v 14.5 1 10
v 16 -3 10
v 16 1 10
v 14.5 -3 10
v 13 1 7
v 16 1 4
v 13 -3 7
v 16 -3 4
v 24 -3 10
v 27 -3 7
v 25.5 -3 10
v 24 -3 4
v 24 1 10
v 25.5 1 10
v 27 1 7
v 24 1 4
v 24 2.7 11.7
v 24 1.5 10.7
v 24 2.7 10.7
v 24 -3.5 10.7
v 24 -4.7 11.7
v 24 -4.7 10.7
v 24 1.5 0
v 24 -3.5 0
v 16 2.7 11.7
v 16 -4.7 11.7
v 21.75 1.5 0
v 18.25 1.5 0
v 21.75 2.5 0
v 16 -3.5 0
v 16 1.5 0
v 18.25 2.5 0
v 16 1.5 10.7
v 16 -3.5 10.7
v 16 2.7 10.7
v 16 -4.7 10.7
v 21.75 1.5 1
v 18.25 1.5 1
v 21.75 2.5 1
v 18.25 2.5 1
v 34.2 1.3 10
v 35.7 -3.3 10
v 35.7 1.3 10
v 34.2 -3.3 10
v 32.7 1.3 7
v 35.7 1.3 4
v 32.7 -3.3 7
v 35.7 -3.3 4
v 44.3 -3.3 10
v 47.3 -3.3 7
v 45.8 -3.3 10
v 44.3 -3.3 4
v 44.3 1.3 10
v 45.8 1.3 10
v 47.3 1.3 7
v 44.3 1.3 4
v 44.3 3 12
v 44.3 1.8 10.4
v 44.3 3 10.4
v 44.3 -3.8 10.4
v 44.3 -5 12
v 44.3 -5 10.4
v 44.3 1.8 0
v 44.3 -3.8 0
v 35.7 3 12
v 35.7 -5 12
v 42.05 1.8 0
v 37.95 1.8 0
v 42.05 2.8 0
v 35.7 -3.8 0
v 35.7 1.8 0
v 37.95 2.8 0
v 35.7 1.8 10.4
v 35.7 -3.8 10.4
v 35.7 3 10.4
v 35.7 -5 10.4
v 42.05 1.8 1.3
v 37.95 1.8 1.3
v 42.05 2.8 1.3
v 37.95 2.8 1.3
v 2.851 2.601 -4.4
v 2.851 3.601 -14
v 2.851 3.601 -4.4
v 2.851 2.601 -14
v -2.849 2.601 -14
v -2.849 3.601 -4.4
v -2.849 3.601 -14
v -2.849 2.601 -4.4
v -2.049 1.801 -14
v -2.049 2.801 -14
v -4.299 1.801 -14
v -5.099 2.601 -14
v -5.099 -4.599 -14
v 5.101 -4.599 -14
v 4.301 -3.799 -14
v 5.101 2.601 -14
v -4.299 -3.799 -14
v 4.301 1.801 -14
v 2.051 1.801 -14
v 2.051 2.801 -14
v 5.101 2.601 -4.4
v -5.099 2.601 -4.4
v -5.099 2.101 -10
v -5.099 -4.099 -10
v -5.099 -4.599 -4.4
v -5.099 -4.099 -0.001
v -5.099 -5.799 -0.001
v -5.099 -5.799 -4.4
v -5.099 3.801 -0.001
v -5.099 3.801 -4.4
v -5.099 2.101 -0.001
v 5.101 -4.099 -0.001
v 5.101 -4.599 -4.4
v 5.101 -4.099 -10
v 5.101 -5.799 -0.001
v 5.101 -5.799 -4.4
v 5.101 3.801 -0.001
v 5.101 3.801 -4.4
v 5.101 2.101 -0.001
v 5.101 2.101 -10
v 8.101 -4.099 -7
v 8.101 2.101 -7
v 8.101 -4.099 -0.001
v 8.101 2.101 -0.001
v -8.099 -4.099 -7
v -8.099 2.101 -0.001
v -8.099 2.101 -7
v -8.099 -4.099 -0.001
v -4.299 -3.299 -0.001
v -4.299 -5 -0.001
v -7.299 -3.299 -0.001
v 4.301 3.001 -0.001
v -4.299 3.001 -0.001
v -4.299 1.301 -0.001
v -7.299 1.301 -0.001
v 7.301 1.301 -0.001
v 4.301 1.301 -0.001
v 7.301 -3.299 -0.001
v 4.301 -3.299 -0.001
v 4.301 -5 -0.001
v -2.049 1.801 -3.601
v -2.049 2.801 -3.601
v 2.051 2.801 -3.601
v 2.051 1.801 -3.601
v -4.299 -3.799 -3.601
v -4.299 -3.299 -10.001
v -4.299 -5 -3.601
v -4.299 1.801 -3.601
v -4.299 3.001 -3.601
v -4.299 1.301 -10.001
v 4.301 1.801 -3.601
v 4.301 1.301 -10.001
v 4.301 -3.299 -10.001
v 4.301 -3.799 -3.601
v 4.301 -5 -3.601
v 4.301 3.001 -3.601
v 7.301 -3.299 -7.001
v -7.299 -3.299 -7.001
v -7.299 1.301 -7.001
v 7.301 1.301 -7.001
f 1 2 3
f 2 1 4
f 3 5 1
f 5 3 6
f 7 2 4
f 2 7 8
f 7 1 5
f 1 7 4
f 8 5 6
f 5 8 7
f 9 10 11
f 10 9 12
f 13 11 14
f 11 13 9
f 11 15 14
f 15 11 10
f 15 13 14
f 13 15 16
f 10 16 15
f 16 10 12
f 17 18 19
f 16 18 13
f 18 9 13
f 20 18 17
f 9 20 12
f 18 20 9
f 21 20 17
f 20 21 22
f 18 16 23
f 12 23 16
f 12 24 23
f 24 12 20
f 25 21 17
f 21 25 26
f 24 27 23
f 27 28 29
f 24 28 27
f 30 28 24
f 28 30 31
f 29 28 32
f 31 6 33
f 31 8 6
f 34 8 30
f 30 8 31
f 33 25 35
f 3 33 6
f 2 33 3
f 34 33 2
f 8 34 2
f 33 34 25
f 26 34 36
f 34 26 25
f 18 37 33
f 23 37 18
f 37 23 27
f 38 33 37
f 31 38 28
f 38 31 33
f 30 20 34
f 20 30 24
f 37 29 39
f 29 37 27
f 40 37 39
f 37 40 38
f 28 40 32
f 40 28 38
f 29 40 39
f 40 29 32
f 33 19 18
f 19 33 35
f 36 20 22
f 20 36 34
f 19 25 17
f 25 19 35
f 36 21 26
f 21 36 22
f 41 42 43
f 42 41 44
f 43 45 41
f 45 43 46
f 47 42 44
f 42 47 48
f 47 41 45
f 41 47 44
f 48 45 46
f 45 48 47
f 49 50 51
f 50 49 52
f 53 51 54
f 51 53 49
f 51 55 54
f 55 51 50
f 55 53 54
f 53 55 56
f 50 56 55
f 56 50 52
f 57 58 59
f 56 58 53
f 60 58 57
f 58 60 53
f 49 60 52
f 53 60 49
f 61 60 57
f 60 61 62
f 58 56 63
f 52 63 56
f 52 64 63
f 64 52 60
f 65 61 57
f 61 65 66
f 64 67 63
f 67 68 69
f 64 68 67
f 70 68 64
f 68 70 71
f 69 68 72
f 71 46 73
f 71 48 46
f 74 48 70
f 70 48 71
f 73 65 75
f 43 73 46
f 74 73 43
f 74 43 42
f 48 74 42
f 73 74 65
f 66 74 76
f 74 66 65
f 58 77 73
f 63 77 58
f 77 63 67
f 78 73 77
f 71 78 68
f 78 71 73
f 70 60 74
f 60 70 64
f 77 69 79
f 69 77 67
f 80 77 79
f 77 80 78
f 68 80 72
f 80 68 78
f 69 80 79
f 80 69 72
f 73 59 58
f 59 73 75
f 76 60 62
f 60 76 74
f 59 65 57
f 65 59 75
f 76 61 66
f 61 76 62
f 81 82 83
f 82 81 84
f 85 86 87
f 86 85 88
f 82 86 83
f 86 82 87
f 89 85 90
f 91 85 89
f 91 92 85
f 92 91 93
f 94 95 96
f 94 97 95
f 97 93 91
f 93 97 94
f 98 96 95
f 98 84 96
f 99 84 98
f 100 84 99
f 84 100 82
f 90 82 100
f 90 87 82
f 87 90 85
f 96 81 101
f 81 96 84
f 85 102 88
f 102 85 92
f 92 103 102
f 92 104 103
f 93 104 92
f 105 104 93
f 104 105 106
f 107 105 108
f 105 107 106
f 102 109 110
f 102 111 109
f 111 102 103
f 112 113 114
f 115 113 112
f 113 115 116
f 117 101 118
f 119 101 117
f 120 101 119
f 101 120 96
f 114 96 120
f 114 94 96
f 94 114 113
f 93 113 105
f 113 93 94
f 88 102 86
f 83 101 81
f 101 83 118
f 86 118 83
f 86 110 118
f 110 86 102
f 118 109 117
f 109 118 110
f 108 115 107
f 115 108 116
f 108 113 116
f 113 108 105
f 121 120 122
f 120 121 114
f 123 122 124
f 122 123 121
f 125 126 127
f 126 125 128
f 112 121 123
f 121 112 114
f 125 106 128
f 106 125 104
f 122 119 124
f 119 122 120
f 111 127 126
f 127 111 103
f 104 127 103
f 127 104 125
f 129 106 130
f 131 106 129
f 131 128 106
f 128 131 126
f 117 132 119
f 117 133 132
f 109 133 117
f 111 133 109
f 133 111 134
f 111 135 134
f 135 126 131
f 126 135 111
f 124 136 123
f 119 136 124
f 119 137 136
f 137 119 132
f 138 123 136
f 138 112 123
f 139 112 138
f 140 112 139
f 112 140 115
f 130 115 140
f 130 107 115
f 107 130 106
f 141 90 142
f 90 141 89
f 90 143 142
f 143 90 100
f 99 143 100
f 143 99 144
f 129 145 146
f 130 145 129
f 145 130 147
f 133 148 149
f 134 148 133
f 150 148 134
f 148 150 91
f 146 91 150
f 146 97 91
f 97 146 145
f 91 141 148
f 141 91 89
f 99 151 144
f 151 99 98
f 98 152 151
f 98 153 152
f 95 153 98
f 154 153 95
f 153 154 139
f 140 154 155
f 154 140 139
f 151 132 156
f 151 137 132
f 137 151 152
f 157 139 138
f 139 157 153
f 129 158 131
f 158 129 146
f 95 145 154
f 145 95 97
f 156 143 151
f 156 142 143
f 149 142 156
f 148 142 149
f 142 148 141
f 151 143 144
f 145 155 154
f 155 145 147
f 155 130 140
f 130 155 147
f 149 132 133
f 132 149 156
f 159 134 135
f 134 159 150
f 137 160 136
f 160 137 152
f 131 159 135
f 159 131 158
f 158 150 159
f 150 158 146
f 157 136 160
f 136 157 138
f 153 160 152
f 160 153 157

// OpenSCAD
// file: sculpt.scad
module sculpt()
{
	if (!is_undef($_sculpt))
		children();
	else
	difference()
	{
		union()
		{
			difference()
			{
				union()
				{
					$_sculpt = "base";
					children();
				}
				union()
				{
					$_sculpt = "base_carve";
					children();
				}
			}
			union()
			{
				$_sculpt = "add";
				children();
			}
		}
		union()
		{
			$_sculpt = "carve";
			children();
		}
	}
}

module sculpt_base()
{
	if ($_sculpt == "base")
	{
		$_sculpt = undef;
		children();
	}
}

module sculpt_add()
{
	if ($_sculpt == "add")
	{
		$_sculpt = undef;
		children();
	}
}

module sculpt_carve()
{
	if ($_sculpt == "carve")
	{
		$_sculpt = undef;
		children();
	}
}

module sculpt_base_carve()
{
	if ($_sculpt == "base_carve")
	union()
	{
		$_sculpt = undef;
		children();
	}
}
// main file
e=.001;

use <sculpt.scad>;

module jst_sm(n=3, margin=0)
{
	h=11.7 + margin;
	w=n*2.5+.5 + 2*margin;
	d=5 + 2*margin;
	y_off = 1;
	top_notch_h = 1+2*margin;
	top_notch_z = h-1-2*margin;
	top_notch_d = d+2.4;

	bottom_notch_h = 1+margin;
	bottom_notch_w = 3.5+2*margin;
	bottom_notch_d = 1;

	grip_d = 4+margin*2;
	grip_w = 3;
	grip_h = 6;
	grip_z = 4;

	color([.3,.3,.3])
	{
		translate([-w/2, -d/2-y_off, 0])
		cube([w, d, h]);

		translate([-bottom_notch_w/2, d/2-y_off, 0])
		cube([bottom_notch_w, bottom_notch_d, bottom_notch_h]);

		translate([-w/2, -top_notch_d/2-y_off, top_notch_z])
		cube([w, top_notch_d, top_notch_h]);

		translate([0,-y_off,0])
		for (zrot=[0,180])
		rotate([0,0,zrot])
		translate([-w/2,-grip_d/2,grip_z])
		rotate([-90,180,0])
		linear_extrude(grip_d)
		polygon([[0,0], [-e,0], [-e, grip_h], [grip_w/2, grip_h], [grip_w, grip_h/2]]);

	}
}


module _jst_sm_cavity(n, margin, z)
{
	minkowski()
	{
		jst_sm(n, margin);
		translate([e/2,e/2,-z])
		cube([e,e,z]);
	}
}

module jst_sm_case_hole(n, margin, z, b)
{
	sculpt()
	{
		sculpt_add()
		{
			difference()
			{
				_jst_sm_cavity(n, margin+b, z);

				w_over = (10+n*2.5);
				d_over = 20;
				h_over = 20;
				translate([-w_over/2, -d_over/2, -e])
				cube([w_over, d_over, h_over]);
			}
		}
		sculpt_carve()
		{
			_jst_sm_cavity(n, margin, z+e);
		}
	}

}


translate([20,0,0])
jst_sm(3, 0);

translate([40,0,0])
jst_sm(3, .3);

jst_sm_case_hole(3, .3, 14, .8);
